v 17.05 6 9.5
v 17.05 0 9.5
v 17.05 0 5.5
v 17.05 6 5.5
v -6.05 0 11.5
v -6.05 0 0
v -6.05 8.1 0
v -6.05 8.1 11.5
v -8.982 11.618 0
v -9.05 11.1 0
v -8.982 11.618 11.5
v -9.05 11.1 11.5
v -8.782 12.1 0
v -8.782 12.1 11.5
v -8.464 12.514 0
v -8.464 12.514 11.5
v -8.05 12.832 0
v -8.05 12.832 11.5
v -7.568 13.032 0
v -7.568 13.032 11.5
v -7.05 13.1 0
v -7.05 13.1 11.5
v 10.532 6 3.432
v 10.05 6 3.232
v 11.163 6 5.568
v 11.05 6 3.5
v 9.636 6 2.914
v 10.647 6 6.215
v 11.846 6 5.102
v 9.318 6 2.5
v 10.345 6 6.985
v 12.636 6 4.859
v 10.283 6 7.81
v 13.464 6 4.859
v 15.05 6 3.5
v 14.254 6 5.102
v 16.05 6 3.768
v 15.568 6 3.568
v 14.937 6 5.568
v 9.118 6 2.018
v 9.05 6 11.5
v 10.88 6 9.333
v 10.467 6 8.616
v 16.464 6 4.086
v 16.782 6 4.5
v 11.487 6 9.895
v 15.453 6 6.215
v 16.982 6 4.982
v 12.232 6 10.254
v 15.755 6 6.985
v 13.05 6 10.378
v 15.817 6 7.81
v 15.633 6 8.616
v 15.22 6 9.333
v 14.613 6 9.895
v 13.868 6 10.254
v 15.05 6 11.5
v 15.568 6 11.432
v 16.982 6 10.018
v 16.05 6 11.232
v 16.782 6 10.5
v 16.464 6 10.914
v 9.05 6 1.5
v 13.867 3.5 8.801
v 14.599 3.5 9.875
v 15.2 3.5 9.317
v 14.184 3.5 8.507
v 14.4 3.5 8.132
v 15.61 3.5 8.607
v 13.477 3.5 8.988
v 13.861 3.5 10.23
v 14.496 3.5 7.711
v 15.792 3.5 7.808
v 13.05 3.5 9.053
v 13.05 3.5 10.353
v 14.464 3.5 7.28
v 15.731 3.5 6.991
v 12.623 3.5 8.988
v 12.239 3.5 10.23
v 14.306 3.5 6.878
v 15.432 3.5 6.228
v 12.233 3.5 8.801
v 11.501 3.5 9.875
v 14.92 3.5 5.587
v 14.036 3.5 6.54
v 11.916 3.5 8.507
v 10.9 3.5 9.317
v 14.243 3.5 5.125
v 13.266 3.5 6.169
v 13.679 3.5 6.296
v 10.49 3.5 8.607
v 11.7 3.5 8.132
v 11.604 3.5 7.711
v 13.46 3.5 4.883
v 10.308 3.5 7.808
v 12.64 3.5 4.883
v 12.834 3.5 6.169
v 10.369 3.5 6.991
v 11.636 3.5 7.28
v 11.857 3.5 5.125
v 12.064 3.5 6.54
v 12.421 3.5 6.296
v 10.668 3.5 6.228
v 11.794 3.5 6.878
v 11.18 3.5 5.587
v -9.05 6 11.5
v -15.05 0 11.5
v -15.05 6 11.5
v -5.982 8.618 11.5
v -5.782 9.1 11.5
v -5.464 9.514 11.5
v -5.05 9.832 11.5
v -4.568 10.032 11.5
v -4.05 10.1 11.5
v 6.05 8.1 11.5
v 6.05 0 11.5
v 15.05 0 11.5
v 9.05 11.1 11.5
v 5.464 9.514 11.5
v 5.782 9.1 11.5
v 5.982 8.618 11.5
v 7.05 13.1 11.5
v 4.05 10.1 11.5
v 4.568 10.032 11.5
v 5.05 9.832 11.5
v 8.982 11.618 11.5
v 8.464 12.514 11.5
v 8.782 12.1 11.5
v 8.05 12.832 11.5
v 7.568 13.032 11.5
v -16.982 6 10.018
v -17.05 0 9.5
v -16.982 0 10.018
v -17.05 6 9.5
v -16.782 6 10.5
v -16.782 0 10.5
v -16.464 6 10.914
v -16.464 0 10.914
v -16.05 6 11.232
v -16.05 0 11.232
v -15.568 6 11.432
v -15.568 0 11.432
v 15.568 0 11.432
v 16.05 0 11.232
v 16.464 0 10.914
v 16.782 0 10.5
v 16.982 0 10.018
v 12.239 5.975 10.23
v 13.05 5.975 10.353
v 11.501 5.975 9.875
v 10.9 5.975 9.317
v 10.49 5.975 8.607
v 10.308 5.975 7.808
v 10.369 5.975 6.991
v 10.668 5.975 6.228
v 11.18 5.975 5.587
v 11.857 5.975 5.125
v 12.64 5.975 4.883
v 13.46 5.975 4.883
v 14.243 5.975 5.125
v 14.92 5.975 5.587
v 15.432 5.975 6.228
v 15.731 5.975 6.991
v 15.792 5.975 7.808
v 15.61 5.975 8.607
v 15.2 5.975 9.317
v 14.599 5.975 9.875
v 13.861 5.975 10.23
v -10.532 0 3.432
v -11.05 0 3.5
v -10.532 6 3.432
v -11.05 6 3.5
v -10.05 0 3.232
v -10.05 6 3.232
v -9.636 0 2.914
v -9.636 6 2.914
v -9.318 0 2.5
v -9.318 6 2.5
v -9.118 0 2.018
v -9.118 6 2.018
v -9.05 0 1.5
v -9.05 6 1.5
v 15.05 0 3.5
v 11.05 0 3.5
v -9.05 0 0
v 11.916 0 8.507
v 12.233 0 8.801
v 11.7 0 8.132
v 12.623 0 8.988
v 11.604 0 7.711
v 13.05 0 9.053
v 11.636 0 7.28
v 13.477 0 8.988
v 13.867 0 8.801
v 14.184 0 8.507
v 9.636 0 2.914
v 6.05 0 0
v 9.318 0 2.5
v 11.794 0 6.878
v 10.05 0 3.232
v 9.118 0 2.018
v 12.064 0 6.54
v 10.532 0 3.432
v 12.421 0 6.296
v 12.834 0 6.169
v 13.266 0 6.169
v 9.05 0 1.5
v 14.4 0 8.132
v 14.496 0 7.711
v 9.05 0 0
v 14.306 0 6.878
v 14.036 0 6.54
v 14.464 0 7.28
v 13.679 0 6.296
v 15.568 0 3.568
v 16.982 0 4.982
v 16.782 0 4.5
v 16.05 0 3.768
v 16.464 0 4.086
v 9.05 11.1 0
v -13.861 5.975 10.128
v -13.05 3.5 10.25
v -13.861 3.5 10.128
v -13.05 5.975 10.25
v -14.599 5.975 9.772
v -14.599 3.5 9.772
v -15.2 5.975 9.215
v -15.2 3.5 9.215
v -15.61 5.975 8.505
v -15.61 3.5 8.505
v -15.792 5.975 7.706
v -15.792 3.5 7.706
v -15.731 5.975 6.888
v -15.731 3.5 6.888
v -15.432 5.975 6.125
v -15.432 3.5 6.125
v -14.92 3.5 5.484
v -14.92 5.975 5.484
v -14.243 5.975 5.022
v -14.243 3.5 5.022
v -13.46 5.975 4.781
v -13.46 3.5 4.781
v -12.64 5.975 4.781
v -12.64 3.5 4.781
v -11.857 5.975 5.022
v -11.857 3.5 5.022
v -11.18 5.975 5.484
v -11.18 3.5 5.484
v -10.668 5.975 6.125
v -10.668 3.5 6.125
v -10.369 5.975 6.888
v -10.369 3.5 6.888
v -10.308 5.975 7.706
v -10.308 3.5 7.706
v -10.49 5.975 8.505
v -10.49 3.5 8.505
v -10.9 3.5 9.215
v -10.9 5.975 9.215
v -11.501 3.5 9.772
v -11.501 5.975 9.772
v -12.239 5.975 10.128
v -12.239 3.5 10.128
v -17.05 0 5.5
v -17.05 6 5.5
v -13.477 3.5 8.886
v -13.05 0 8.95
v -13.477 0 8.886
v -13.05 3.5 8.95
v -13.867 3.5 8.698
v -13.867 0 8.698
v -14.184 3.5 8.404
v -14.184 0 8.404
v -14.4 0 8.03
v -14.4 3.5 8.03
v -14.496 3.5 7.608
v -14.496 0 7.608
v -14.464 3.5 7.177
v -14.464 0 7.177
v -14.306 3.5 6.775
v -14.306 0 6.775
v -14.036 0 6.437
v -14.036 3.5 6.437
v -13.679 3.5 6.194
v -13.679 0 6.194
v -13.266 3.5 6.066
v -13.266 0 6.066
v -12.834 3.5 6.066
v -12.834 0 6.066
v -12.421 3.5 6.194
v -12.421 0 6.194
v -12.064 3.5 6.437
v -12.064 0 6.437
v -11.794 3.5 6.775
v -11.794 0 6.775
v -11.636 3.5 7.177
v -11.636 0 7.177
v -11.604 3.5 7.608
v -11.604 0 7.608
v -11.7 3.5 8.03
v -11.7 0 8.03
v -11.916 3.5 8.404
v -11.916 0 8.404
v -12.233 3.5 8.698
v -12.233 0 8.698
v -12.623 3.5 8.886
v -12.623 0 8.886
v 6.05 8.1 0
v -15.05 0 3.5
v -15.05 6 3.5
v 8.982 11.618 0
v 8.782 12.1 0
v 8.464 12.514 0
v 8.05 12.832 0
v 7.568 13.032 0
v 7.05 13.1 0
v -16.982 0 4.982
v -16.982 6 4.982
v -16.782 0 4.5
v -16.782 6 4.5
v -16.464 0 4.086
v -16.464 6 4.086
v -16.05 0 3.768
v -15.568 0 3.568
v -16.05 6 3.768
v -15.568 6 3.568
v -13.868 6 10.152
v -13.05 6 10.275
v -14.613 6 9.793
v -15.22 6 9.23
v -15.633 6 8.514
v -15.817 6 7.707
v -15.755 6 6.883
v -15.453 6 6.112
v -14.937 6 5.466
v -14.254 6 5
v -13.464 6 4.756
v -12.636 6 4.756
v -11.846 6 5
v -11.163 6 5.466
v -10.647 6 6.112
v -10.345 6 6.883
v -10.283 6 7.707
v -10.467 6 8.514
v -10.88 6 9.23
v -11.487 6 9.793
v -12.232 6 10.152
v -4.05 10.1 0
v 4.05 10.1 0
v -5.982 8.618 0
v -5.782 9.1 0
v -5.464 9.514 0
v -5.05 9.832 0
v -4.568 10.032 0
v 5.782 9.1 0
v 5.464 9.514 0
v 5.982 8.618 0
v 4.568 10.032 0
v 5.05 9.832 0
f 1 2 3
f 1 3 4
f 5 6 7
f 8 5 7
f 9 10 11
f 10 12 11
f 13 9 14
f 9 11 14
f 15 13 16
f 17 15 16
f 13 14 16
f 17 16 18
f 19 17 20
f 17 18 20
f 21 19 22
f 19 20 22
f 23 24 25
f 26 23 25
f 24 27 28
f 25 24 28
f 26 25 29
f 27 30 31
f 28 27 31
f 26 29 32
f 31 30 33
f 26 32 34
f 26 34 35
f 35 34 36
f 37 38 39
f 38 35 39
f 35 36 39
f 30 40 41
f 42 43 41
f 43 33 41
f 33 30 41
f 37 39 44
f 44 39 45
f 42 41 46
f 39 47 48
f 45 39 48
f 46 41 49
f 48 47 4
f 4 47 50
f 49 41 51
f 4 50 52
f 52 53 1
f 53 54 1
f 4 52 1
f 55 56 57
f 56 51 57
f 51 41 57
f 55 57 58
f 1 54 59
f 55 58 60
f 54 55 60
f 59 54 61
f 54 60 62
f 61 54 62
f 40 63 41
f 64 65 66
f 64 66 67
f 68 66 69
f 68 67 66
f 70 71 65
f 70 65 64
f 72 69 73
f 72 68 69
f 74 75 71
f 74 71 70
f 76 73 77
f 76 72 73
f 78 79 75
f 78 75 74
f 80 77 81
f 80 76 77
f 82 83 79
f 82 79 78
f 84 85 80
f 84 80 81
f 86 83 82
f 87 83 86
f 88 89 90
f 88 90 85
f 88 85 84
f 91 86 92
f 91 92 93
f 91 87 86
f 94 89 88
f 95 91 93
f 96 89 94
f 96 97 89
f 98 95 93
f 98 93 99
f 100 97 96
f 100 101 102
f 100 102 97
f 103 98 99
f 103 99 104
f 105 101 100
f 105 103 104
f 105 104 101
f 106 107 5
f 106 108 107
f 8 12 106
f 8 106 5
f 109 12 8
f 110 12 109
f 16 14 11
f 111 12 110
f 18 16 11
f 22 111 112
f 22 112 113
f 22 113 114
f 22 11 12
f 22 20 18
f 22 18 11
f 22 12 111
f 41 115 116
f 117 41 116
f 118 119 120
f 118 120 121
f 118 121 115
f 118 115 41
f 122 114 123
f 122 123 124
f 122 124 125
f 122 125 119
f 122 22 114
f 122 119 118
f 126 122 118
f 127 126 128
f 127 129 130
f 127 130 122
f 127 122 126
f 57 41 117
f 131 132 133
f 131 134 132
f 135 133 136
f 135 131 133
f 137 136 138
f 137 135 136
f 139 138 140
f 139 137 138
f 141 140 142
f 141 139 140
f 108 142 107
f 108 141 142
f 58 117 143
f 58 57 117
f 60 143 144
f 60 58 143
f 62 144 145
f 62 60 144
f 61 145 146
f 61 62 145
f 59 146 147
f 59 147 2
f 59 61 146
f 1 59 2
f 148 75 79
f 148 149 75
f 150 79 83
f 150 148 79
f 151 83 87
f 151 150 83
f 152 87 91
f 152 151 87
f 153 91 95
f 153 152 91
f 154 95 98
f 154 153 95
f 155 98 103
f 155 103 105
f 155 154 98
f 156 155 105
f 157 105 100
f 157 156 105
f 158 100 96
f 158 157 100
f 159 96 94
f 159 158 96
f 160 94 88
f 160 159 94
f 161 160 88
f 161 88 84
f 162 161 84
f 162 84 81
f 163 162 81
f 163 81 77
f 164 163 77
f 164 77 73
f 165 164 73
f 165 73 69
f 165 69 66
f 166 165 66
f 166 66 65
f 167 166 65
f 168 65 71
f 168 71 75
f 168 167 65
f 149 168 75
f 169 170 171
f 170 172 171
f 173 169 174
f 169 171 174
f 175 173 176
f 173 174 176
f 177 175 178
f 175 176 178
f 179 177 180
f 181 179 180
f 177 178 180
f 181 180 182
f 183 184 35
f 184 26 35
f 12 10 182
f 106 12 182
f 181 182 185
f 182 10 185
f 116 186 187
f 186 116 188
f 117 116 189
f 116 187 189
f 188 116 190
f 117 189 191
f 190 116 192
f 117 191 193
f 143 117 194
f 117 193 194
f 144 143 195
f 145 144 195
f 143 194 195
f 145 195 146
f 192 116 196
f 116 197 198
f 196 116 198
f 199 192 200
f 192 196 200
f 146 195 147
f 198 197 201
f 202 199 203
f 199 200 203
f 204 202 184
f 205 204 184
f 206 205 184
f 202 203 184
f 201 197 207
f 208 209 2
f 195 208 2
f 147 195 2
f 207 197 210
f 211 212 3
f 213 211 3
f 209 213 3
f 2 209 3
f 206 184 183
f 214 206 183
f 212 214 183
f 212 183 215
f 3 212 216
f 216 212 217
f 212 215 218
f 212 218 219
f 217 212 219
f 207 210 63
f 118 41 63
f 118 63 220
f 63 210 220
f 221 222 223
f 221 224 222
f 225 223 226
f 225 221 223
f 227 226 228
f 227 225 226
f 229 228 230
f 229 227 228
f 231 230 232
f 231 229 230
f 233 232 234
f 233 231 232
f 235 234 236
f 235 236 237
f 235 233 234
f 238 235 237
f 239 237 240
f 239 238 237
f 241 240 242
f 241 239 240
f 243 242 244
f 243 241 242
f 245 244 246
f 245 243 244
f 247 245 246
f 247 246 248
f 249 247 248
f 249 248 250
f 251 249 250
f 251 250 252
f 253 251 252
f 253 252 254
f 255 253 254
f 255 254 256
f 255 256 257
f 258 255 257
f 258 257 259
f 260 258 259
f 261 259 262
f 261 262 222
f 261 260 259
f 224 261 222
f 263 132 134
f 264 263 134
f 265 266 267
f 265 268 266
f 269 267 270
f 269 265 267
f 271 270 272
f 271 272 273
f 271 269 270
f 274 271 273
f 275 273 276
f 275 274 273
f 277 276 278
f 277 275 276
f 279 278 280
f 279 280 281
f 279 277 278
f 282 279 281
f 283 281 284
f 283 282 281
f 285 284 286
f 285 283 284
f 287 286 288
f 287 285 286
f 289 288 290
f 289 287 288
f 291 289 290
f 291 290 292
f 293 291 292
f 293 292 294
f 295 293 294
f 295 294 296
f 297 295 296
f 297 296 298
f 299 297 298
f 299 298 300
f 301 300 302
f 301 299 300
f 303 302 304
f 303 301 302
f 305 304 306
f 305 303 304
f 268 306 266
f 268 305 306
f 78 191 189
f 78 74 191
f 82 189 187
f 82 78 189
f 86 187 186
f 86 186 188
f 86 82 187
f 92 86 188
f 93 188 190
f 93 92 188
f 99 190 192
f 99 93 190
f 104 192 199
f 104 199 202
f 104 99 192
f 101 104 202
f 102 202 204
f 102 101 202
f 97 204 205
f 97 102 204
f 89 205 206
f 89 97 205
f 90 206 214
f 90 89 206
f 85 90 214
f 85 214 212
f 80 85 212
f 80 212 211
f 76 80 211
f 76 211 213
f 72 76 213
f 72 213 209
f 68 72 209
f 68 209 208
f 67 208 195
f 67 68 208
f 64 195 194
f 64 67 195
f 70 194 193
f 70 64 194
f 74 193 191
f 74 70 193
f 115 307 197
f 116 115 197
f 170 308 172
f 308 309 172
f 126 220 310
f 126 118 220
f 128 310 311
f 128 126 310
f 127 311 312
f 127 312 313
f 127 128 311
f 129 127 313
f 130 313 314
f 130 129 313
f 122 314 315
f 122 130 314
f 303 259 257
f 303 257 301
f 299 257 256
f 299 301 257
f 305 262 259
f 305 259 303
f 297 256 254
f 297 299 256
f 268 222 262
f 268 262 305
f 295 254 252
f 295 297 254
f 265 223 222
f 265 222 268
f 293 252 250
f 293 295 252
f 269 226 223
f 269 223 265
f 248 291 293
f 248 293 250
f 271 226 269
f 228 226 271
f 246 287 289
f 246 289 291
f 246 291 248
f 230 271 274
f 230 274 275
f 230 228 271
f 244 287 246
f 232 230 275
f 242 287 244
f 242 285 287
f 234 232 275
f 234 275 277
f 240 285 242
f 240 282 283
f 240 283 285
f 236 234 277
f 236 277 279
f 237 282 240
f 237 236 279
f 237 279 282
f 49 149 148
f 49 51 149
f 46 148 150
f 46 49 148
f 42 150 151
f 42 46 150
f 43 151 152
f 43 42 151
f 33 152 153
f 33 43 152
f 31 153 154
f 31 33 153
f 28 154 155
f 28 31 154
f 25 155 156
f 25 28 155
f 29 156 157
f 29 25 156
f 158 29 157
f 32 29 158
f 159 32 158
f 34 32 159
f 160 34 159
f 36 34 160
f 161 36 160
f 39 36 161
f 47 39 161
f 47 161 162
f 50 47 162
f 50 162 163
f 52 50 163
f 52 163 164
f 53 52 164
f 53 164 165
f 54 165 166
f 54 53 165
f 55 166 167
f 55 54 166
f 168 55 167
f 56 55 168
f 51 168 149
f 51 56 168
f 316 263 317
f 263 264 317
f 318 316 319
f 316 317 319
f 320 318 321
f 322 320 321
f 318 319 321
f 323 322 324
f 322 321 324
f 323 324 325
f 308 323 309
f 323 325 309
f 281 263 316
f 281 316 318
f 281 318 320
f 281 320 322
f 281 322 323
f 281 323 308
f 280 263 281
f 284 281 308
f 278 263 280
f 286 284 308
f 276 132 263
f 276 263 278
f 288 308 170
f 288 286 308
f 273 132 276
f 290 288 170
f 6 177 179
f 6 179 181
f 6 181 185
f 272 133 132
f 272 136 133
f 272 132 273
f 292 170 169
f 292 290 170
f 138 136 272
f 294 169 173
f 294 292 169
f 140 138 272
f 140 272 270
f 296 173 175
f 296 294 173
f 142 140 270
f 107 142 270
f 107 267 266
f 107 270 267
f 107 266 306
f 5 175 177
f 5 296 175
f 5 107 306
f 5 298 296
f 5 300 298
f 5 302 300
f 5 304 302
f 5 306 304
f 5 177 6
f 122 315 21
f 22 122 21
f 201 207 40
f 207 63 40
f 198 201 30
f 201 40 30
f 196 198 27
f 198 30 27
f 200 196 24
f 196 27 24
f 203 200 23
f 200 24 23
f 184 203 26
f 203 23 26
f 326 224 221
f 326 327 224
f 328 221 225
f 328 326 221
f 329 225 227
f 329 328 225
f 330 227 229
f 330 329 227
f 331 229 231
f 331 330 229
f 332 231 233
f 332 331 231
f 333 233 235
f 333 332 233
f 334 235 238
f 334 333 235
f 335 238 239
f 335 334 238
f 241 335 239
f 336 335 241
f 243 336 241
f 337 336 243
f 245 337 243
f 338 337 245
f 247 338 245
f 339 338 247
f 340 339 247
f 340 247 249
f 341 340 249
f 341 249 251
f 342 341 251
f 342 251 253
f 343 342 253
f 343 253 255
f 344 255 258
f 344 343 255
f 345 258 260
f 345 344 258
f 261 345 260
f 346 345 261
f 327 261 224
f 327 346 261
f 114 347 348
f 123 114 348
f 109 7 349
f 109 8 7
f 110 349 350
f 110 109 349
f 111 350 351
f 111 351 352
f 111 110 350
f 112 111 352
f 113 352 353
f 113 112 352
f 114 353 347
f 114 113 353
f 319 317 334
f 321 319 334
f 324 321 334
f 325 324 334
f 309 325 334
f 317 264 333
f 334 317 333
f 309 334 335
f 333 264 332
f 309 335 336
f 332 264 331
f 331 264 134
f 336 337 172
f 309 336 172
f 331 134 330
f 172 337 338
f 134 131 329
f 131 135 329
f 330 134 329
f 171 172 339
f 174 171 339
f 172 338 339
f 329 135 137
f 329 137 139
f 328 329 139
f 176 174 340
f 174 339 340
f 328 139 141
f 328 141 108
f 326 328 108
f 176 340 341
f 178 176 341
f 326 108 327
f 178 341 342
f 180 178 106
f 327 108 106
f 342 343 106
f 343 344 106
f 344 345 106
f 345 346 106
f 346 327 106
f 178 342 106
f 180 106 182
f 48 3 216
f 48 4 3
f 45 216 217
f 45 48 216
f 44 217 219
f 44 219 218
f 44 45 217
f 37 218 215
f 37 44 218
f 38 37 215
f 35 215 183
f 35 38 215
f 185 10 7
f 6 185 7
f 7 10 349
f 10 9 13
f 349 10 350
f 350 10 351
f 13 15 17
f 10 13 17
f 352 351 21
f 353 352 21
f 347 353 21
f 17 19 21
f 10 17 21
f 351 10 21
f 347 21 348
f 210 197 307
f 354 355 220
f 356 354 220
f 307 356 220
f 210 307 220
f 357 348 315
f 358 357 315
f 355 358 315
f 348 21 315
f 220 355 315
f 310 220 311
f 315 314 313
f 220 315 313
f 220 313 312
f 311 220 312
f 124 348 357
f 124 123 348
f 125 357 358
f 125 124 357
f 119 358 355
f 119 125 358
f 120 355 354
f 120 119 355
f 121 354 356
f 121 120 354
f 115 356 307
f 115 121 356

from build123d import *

# Parameters (mm, degrees)
BOSS_EXTRUDE1_DEPTH             = 11.5
SKETCH2_W                       = 8
SKETCH2_H                       = 6
BOSS_EXTRUDE2_DEPTH             = 8
CBORE_FOR_M2_5_SHCS1_AT_2_COUNT = 2
CBORE_FOR_M2_5_SHCS1_AT_2_PITCH = 26.100201416
FILLET2_R                       = 2


with BuildPart() as part:
    # Sketch1 → Boss-Extrude1 (new body)
    with BuildSketch(Plane.XY):
        Polygon((-9.05, 0), (-6.05, 0), (-6.05, 10.1), (6.05, 10.1), (6.05, 0), (9.05, 0), (9.05, 13.1), (-9.05, 13.1), align=None)
    extrude(amount=BOSS_EXTRUDE1_DEPTH)

    # Sketch2 → Boss-Extrude2 (add)
    with BuildSketch(Plane.XY.offset(11.5)):
        with Locations((-13.05, 3)):
            Rectangle(SKETCH2_W, SKETCH2_H)
        with Locations((13.05, 3)):
            Rectangle(SKETCH2_W, SKETCH2_H)
    extrude(amount=-BOSS_EXTRUDE2_DEPTH)

    # Sketch4 → CBORE for M2.5 SHCS1 (revolve, cut)
    with BuildSketch(Plane(origin=(-13.05, 6, 7.5), x_dir=(0, 0, 1), z_dir=(1, 0, 0))):
        Polygon((0, 0), (0, 6), (1.45, 6), (1.45, 2.5), (2.75, 2.5), (2.75, 0.025), (2.775, 0), align=None)
    cbore_for_m2_5_shcs1 = revolve(axis=Axis((-13.05, 12.35, 7.5), (0, -1, 0)), mode=Mode.SUBTRACT)

    # CBORE for M2.5 SHCS1 at 2: CBORE for M2.5 SHCS1 ×2
    with Locations(*[Vector(0.999992282957316, 0, 0.003928616272342698) * (i * CBORE_FOR_M2_5_SHCS1_AT_2_PITCH) for i in range(1, CBORE_FOR_M2_5_SHCS1_AT_2_COUNT)]):
        add(cbore_for_m2_5_shcs1, mode=Mode.SUBTRACT)

    # Fillet2
    fillet2_edges = [part.edges().sort_by_distance(p)[0] for p in [
        (-9.05, 13.1, 5.75),
        (9.05, 13.1, 5.75),
        (6.05, 10.1, 5.75),
        (-6.05, 10.1, 5.75),
        (-9.05, 3, 3.5),
        (-17.05, 3, 3.5),
        (-17.05, 3, 11.5),
        (9.05, 3, 3.5),
        (17.05, 3, 3.5),
        (17.05, 3, 11.5),
    ]]
    fillet(fillet2_edges, radius=FILLET2_R)


solid = part.part
